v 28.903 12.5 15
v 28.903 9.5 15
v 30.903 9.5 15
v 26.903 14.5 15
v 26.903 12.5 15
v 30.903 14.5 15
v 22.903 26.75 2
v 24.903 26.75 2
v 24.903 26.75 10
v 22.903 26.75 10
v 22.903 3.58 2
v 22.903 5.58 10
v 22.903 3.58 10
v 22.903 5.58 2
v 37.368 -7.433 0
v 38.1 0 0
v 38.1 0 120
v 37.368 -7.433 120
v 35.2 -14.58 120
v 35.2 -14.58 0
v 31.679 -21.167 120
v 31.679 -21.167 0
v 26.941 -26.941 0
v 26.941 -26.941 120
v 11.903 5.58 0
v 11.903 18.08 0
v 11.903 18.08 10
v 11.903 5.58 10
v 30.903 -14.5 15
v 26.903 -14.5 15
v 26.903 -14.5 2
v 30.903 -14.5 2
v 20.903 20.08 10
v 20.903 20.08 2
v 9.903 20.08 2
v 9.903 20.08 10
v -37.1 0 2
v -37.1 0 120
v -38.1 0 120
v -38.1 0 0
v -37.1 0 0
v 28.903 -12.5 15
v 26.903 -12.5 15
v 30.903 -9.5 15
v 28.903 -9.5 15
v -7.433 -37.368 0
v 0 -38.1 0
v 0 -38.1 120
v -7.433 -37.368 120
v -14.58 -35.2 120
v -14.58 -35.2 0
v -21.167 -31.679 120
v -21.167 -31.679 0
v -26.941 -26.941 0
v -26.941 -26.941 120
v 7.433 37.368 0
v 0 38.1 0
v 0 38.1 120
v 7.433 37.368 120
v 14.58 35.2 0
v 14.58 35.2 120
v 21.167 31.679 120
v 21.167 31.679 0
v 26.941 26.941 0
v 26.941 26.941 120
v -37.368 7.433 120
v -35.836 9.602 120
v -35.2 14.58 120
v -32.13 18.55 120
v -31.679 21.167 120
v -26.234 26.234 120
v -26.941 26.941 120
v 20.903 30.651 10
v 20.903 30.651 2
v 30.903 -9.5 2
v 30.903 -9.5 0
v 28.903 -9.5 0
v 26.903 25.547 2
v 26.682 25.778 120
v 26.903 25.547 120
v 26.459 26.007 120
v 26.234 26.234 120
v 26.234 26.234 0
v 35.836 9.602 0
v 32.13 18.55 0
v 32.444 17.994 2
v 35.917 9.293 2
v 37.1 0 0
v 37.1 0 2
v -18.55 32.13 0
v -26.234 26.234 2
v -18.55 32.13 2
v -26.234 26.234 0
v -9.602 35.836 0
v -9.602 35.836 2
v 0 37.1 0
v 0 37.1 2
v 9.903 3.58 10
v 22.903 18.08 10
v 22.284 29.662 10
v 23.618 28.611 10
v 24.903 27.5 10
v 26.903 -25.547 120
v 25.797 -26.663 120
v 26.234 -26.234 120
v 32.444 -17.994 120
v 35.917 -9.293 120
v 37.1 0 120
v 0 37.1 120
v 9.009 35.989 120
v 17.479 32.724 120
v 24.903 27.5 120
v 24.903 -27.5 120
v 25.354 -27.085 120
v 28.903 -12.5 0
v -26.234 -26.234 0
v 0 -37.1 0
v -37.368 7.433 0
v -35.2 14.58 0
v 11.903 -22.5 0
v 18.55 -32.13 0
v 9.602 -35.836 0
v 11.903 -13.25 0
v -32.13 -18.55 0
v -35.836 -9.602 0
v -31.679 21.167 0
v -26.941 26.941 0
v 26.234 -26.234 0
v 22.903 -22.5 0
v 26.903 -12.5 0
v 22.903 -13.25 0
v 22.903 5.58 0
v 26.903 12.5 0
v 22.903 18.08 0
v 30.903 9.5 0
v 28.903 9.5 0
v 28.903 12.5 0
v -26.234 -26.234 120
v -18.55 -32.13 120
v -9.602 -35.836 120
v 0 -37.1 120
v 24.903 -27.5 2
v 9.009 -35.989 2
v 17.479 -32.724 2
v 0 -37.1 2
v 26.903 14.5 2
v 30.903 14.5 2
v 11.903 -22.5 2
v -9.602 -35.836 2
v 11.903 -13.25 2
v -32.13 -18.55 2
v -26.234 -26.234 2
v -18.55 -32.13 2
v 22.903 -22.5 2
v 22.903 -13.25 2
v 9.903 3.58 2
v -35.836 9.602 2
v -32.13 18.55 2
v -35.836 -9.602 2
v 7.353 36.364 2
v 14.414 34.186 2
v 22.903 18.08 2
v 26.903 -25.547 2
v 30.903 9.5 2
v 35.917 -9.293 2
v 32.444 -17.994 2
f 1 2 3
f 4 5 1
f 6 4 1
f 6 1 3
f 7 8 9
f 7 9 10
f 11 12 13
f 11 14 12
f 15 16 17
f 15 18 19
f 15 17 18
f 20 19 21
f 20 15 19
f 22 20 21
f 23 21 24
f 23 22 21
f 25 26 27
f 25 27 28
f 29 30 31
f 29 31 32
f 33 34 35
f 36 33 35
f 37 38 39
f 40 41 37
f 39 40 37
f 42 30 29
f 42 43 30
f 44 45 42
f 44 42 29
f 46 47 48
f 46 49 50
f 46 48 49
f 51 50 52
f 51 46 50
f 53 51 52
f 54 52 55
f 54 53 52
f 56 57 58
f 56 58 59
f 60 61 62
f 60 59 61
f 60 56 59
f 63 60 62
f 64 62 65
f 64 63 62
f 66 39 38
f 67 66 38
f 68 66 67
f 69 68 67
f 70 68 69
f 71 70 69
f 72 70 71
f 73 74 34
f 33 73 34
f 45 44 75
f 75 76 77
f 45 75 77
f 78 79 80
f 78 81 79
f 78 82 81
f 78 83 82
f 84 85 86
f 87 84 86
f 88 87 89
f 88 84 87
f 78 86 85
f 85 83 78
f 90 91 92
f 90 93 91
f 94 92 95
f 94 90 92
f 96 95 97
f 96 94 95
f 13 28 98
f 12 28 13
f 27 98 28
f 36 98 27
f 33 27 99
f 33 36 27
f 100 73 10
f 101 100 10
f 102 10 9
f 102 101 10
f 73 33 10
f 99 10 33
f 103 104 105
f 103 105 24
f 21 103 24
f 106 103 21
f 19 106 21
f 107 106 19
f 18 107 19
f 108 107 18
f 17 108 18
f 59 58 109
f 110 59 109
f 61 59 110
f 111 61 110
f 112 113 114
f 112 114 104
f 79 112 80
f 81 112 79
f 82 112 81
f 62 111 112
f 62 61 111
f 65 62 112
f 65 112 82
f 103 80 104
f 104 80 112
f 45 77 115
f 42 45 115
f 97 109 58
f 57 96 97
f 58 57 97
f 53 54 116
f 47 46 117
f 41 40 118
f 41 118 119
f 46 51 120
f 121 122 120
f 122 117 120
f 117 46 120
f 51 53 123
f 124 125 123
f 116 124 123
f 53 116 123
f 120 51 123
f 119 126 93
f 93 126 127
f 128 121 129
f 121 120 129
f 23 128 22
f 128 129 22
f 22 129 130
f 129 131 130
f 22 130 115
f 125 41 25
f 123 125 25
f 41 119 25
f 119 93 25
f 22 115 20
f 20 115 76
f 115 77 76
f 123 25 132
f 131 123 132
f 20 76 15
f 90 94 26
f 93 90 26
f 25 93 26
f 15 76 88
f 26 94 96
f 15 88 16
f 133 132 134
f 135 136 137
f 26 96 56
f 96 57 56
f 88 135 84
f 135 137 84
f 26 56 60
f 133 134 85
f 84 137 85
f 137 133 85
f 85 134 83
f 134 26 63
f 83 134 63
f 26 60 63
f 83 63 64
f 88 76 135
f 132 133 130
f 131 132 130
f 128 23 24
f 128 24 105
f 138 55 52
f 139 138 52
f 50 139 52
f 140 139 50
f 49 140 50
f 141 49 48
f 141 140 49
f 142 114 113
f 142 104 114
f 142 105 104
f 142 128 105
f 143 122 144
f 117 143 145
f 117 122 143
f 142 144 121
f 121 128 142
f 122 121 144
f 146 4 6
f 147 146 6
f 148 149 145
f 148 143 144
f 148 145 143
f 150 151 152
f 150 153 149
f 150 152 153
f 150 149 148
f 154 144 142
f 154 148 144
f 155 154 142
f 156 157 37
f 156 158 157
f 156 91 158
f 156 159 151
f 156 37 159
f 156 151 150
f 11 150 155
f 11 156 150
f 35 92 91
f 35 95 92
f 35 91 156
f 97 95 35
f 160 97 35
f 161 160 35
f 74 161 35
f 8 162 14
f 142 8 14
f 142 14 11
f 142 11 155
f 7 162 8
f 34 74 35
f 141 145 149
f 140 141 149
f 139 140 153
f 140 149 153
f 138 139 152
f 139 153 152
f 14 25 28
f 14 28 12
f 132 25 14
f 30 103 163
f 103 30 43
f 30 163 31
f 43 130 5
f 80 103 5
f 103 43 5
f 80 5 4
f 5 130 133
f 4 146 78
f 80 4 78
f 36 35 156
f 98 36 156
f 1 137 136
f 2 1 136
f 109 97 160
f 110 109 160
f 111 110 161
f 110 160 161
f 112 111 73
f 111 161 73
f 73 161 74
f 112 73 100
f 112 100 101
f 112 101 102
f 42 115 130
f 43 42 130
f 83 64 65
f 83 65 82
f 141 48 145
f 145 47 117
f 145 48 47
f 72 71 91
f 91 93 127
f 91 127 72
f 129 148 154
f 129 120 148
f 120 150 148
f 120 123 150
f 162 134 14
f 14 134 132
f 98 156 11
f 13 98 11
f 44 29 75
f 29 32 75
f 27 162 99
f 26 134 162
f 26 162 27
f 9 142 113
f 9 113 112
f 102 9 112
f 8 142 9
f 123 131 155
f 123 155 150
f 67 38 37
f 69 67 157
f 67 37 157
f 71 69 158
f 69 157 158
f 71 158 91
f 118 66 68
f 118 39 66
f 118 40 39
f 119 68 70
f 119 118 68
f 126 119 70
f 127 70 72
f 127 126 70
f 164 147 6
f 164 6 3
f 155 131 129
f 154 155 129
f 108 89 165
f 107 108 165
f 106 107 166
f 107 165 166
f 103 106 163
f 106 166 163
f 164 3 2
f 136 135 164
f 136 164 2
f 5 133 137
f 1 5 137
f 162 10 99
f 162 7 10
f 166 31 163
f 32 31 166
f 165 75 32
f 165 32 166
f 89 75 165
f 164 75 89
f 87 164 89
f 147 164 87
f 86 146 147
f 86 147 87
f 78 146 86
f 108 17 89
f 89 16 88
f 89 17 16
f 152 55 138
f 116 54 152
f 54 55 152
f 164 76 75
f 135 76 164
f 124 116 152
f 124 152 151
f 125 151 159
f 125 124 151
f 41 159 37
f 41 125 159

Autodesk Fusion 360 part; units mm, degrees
sketch "Sketch1" plane through (0, 0, 0) normal (0, 0, 1) x (1, 0, 0)
  circle A0 centre (0, 0) radius 38.1
  circle A1 centre (0, 0) radius 37.1
  line L0 (24.903, -27.5) -> (24.903, 27.5)
  line L1 (26.903, -25.5468) -> (26.903, 25.5468)
  line L2 (26.903, 12.5) -> (28.903, 12.5)
  line L3 (28.903, 12.5) -> (28.903, -12.5)
  line L4 (28.903, -12.5) -> (26.903, -12.5)
  line L5 (26.903, -12.5) -> (26.903, 12.5)
  line L6 (26.903, 14.5) -> (30.903, 14.5)
  line L7 (30.903, 14.5) -> (30.903, 9.5)
  line L8 (30.903, 9.5) -> (28.903, 9.5)
  line L9 (26.903, -14.5) -> (30.903, -14.5)
  line L10 (30.903, -14.5) -> (30.903, -9.5)
  line L11 (30.903, -9.5) -> (28.903, -9.5)
  line L12 (1.75, 0) -> (22.5, 0)
  line L13 (24.903, 26.75) -> (22.903, 26.75)
  line L14 (22.903, 26.75) -> (22.903, -26.75)
  line L15 (22.903, -26.75) -> (24.903, -26.75)
  line L16 (24.903, -26.75) -> (24.903, 26.75)
  line L17 (22.903, 18.08) -> (11.903, 18.08)
  line L18 (11.903, 18.08) -> (11.903, 5.58)
  line L19 (11.903, 5.58) -> (22.903, 5.58)
  line L20 (22.903, 5.58) -> (22.903, 18.08)
  line L21 (22.903, -13.25) -> (11.903, -13.25)
  line L22 (11.903, -13.25) -> (11.903, -22.5)
  line L23 (11.903, -22.5) -> (22.903, -22.5)
  line L24 (22.903, -22.5) -> (22.903, -13.25)
  line L25 (30.903, -9.5) -> (30.903, 9.5)
  line L26 (0, -38.1) -> (0, 38.1) construction
  line L27 (-38.1, 0) -> (38.1, 0) construction
  line L28 (26.9408, -26.9408) -> (-26.9408, 26.9408) construction
  line L29 (26.9408, 26.9408) -> (-26.9408, -26.9408) construction
  line L30 (0, 37.1) -> (0, 38.1)
  line L31 (-26.2337, 26.2337) -> (-26.9408, 26.9408)
  line L32 (-37.1, 0) -> (-38.1, 0)
  line L33 (-26.9408, -26.9408) -> (-26.2337, -26.2337)
  line L34 (0, -38.1) -> (0, -37.1)
  line L35 (26.9408, -26.9408) -> (26.2337, -26.2337)
  line L36 (38.1, 0) -> (37.1, 0)
  line L37 (26.9408, 26.9408) -> (26.2337, 26.2337)
  line L38 (20.903, 30.6508) -> (20.903, 20.08)
  line L39 (20.903, 20.08) -> (9.903, 20.08)
  line L40 (9.903, 20.08) -> (9.903, 3.58)
  line L41 (9.903, 3.58) -> (22.903, 3.58)
  point P0 (28.903, 0)
  point P1 (22.903, 0)
  dimension "d1" = 76.2
  dimension "d2" = 1
  dimension "d3" = 55
  dimension "d4" = 2
  dimension "d5" = 2
  dimension "d6" = 2
  dimension "d7" = 2
  dimension "d8" = 3
  dimension "d9" = 25
  dimension "d10" = 2
  dimension "d11" = 2
  dimension "d12" = 53.5
  dimension "d13" = 12.5
  dimension "d14" = 11
  dimension "d15" = 8.67
  dimension "d16" = 9.25
  dimension "d17" = 11
  dimension "d18" = 4.25
  dimension "d23" = 45
  dimension "d27" = 2
  dimension "d28" = 2
  dimension "d29" = 2
  dimension "d30" = 2
extrude "Extrude1" add sketch "Sketch1" along normal blind 2 contours A1 L1 L6 L7 L9 L10 L25 | A1 L0 L14 L15 L21 L22 L23 L38 L39 L40 L41 | A1 L0 L13 L14 L17 L18 L19 L38 L39 L40 L41 | L0 L13 L14 L15 L16 L20 L24 makes body 1 at (-3.5853, -7.0522, 0) makes body 2 at (32.7043, -2.5435, 0)
extrude "Extrude2" add sketch "Sketch1" along normal blind 15 contours L1 L2 L3 L6 L7 L8 | L1 L3 L4 L9 L10 L11 bodies 2
extrude "Extrude3" add sketch "Sketch1" along normal blind 120 contours A0 A1 L35 L36 | A0 A1 L30 L37 | A1 L0 L1 L5 L16 | A0 A1 L33 L34 | A0 A1 L31 L32 bodies 2 1
extrude "Extrude4" add sketch "Sketch1" along normal blind 10 contours A1 L0 L13 L14 L17 L18 L19 L38 L39 L40 L41 bodies 2
